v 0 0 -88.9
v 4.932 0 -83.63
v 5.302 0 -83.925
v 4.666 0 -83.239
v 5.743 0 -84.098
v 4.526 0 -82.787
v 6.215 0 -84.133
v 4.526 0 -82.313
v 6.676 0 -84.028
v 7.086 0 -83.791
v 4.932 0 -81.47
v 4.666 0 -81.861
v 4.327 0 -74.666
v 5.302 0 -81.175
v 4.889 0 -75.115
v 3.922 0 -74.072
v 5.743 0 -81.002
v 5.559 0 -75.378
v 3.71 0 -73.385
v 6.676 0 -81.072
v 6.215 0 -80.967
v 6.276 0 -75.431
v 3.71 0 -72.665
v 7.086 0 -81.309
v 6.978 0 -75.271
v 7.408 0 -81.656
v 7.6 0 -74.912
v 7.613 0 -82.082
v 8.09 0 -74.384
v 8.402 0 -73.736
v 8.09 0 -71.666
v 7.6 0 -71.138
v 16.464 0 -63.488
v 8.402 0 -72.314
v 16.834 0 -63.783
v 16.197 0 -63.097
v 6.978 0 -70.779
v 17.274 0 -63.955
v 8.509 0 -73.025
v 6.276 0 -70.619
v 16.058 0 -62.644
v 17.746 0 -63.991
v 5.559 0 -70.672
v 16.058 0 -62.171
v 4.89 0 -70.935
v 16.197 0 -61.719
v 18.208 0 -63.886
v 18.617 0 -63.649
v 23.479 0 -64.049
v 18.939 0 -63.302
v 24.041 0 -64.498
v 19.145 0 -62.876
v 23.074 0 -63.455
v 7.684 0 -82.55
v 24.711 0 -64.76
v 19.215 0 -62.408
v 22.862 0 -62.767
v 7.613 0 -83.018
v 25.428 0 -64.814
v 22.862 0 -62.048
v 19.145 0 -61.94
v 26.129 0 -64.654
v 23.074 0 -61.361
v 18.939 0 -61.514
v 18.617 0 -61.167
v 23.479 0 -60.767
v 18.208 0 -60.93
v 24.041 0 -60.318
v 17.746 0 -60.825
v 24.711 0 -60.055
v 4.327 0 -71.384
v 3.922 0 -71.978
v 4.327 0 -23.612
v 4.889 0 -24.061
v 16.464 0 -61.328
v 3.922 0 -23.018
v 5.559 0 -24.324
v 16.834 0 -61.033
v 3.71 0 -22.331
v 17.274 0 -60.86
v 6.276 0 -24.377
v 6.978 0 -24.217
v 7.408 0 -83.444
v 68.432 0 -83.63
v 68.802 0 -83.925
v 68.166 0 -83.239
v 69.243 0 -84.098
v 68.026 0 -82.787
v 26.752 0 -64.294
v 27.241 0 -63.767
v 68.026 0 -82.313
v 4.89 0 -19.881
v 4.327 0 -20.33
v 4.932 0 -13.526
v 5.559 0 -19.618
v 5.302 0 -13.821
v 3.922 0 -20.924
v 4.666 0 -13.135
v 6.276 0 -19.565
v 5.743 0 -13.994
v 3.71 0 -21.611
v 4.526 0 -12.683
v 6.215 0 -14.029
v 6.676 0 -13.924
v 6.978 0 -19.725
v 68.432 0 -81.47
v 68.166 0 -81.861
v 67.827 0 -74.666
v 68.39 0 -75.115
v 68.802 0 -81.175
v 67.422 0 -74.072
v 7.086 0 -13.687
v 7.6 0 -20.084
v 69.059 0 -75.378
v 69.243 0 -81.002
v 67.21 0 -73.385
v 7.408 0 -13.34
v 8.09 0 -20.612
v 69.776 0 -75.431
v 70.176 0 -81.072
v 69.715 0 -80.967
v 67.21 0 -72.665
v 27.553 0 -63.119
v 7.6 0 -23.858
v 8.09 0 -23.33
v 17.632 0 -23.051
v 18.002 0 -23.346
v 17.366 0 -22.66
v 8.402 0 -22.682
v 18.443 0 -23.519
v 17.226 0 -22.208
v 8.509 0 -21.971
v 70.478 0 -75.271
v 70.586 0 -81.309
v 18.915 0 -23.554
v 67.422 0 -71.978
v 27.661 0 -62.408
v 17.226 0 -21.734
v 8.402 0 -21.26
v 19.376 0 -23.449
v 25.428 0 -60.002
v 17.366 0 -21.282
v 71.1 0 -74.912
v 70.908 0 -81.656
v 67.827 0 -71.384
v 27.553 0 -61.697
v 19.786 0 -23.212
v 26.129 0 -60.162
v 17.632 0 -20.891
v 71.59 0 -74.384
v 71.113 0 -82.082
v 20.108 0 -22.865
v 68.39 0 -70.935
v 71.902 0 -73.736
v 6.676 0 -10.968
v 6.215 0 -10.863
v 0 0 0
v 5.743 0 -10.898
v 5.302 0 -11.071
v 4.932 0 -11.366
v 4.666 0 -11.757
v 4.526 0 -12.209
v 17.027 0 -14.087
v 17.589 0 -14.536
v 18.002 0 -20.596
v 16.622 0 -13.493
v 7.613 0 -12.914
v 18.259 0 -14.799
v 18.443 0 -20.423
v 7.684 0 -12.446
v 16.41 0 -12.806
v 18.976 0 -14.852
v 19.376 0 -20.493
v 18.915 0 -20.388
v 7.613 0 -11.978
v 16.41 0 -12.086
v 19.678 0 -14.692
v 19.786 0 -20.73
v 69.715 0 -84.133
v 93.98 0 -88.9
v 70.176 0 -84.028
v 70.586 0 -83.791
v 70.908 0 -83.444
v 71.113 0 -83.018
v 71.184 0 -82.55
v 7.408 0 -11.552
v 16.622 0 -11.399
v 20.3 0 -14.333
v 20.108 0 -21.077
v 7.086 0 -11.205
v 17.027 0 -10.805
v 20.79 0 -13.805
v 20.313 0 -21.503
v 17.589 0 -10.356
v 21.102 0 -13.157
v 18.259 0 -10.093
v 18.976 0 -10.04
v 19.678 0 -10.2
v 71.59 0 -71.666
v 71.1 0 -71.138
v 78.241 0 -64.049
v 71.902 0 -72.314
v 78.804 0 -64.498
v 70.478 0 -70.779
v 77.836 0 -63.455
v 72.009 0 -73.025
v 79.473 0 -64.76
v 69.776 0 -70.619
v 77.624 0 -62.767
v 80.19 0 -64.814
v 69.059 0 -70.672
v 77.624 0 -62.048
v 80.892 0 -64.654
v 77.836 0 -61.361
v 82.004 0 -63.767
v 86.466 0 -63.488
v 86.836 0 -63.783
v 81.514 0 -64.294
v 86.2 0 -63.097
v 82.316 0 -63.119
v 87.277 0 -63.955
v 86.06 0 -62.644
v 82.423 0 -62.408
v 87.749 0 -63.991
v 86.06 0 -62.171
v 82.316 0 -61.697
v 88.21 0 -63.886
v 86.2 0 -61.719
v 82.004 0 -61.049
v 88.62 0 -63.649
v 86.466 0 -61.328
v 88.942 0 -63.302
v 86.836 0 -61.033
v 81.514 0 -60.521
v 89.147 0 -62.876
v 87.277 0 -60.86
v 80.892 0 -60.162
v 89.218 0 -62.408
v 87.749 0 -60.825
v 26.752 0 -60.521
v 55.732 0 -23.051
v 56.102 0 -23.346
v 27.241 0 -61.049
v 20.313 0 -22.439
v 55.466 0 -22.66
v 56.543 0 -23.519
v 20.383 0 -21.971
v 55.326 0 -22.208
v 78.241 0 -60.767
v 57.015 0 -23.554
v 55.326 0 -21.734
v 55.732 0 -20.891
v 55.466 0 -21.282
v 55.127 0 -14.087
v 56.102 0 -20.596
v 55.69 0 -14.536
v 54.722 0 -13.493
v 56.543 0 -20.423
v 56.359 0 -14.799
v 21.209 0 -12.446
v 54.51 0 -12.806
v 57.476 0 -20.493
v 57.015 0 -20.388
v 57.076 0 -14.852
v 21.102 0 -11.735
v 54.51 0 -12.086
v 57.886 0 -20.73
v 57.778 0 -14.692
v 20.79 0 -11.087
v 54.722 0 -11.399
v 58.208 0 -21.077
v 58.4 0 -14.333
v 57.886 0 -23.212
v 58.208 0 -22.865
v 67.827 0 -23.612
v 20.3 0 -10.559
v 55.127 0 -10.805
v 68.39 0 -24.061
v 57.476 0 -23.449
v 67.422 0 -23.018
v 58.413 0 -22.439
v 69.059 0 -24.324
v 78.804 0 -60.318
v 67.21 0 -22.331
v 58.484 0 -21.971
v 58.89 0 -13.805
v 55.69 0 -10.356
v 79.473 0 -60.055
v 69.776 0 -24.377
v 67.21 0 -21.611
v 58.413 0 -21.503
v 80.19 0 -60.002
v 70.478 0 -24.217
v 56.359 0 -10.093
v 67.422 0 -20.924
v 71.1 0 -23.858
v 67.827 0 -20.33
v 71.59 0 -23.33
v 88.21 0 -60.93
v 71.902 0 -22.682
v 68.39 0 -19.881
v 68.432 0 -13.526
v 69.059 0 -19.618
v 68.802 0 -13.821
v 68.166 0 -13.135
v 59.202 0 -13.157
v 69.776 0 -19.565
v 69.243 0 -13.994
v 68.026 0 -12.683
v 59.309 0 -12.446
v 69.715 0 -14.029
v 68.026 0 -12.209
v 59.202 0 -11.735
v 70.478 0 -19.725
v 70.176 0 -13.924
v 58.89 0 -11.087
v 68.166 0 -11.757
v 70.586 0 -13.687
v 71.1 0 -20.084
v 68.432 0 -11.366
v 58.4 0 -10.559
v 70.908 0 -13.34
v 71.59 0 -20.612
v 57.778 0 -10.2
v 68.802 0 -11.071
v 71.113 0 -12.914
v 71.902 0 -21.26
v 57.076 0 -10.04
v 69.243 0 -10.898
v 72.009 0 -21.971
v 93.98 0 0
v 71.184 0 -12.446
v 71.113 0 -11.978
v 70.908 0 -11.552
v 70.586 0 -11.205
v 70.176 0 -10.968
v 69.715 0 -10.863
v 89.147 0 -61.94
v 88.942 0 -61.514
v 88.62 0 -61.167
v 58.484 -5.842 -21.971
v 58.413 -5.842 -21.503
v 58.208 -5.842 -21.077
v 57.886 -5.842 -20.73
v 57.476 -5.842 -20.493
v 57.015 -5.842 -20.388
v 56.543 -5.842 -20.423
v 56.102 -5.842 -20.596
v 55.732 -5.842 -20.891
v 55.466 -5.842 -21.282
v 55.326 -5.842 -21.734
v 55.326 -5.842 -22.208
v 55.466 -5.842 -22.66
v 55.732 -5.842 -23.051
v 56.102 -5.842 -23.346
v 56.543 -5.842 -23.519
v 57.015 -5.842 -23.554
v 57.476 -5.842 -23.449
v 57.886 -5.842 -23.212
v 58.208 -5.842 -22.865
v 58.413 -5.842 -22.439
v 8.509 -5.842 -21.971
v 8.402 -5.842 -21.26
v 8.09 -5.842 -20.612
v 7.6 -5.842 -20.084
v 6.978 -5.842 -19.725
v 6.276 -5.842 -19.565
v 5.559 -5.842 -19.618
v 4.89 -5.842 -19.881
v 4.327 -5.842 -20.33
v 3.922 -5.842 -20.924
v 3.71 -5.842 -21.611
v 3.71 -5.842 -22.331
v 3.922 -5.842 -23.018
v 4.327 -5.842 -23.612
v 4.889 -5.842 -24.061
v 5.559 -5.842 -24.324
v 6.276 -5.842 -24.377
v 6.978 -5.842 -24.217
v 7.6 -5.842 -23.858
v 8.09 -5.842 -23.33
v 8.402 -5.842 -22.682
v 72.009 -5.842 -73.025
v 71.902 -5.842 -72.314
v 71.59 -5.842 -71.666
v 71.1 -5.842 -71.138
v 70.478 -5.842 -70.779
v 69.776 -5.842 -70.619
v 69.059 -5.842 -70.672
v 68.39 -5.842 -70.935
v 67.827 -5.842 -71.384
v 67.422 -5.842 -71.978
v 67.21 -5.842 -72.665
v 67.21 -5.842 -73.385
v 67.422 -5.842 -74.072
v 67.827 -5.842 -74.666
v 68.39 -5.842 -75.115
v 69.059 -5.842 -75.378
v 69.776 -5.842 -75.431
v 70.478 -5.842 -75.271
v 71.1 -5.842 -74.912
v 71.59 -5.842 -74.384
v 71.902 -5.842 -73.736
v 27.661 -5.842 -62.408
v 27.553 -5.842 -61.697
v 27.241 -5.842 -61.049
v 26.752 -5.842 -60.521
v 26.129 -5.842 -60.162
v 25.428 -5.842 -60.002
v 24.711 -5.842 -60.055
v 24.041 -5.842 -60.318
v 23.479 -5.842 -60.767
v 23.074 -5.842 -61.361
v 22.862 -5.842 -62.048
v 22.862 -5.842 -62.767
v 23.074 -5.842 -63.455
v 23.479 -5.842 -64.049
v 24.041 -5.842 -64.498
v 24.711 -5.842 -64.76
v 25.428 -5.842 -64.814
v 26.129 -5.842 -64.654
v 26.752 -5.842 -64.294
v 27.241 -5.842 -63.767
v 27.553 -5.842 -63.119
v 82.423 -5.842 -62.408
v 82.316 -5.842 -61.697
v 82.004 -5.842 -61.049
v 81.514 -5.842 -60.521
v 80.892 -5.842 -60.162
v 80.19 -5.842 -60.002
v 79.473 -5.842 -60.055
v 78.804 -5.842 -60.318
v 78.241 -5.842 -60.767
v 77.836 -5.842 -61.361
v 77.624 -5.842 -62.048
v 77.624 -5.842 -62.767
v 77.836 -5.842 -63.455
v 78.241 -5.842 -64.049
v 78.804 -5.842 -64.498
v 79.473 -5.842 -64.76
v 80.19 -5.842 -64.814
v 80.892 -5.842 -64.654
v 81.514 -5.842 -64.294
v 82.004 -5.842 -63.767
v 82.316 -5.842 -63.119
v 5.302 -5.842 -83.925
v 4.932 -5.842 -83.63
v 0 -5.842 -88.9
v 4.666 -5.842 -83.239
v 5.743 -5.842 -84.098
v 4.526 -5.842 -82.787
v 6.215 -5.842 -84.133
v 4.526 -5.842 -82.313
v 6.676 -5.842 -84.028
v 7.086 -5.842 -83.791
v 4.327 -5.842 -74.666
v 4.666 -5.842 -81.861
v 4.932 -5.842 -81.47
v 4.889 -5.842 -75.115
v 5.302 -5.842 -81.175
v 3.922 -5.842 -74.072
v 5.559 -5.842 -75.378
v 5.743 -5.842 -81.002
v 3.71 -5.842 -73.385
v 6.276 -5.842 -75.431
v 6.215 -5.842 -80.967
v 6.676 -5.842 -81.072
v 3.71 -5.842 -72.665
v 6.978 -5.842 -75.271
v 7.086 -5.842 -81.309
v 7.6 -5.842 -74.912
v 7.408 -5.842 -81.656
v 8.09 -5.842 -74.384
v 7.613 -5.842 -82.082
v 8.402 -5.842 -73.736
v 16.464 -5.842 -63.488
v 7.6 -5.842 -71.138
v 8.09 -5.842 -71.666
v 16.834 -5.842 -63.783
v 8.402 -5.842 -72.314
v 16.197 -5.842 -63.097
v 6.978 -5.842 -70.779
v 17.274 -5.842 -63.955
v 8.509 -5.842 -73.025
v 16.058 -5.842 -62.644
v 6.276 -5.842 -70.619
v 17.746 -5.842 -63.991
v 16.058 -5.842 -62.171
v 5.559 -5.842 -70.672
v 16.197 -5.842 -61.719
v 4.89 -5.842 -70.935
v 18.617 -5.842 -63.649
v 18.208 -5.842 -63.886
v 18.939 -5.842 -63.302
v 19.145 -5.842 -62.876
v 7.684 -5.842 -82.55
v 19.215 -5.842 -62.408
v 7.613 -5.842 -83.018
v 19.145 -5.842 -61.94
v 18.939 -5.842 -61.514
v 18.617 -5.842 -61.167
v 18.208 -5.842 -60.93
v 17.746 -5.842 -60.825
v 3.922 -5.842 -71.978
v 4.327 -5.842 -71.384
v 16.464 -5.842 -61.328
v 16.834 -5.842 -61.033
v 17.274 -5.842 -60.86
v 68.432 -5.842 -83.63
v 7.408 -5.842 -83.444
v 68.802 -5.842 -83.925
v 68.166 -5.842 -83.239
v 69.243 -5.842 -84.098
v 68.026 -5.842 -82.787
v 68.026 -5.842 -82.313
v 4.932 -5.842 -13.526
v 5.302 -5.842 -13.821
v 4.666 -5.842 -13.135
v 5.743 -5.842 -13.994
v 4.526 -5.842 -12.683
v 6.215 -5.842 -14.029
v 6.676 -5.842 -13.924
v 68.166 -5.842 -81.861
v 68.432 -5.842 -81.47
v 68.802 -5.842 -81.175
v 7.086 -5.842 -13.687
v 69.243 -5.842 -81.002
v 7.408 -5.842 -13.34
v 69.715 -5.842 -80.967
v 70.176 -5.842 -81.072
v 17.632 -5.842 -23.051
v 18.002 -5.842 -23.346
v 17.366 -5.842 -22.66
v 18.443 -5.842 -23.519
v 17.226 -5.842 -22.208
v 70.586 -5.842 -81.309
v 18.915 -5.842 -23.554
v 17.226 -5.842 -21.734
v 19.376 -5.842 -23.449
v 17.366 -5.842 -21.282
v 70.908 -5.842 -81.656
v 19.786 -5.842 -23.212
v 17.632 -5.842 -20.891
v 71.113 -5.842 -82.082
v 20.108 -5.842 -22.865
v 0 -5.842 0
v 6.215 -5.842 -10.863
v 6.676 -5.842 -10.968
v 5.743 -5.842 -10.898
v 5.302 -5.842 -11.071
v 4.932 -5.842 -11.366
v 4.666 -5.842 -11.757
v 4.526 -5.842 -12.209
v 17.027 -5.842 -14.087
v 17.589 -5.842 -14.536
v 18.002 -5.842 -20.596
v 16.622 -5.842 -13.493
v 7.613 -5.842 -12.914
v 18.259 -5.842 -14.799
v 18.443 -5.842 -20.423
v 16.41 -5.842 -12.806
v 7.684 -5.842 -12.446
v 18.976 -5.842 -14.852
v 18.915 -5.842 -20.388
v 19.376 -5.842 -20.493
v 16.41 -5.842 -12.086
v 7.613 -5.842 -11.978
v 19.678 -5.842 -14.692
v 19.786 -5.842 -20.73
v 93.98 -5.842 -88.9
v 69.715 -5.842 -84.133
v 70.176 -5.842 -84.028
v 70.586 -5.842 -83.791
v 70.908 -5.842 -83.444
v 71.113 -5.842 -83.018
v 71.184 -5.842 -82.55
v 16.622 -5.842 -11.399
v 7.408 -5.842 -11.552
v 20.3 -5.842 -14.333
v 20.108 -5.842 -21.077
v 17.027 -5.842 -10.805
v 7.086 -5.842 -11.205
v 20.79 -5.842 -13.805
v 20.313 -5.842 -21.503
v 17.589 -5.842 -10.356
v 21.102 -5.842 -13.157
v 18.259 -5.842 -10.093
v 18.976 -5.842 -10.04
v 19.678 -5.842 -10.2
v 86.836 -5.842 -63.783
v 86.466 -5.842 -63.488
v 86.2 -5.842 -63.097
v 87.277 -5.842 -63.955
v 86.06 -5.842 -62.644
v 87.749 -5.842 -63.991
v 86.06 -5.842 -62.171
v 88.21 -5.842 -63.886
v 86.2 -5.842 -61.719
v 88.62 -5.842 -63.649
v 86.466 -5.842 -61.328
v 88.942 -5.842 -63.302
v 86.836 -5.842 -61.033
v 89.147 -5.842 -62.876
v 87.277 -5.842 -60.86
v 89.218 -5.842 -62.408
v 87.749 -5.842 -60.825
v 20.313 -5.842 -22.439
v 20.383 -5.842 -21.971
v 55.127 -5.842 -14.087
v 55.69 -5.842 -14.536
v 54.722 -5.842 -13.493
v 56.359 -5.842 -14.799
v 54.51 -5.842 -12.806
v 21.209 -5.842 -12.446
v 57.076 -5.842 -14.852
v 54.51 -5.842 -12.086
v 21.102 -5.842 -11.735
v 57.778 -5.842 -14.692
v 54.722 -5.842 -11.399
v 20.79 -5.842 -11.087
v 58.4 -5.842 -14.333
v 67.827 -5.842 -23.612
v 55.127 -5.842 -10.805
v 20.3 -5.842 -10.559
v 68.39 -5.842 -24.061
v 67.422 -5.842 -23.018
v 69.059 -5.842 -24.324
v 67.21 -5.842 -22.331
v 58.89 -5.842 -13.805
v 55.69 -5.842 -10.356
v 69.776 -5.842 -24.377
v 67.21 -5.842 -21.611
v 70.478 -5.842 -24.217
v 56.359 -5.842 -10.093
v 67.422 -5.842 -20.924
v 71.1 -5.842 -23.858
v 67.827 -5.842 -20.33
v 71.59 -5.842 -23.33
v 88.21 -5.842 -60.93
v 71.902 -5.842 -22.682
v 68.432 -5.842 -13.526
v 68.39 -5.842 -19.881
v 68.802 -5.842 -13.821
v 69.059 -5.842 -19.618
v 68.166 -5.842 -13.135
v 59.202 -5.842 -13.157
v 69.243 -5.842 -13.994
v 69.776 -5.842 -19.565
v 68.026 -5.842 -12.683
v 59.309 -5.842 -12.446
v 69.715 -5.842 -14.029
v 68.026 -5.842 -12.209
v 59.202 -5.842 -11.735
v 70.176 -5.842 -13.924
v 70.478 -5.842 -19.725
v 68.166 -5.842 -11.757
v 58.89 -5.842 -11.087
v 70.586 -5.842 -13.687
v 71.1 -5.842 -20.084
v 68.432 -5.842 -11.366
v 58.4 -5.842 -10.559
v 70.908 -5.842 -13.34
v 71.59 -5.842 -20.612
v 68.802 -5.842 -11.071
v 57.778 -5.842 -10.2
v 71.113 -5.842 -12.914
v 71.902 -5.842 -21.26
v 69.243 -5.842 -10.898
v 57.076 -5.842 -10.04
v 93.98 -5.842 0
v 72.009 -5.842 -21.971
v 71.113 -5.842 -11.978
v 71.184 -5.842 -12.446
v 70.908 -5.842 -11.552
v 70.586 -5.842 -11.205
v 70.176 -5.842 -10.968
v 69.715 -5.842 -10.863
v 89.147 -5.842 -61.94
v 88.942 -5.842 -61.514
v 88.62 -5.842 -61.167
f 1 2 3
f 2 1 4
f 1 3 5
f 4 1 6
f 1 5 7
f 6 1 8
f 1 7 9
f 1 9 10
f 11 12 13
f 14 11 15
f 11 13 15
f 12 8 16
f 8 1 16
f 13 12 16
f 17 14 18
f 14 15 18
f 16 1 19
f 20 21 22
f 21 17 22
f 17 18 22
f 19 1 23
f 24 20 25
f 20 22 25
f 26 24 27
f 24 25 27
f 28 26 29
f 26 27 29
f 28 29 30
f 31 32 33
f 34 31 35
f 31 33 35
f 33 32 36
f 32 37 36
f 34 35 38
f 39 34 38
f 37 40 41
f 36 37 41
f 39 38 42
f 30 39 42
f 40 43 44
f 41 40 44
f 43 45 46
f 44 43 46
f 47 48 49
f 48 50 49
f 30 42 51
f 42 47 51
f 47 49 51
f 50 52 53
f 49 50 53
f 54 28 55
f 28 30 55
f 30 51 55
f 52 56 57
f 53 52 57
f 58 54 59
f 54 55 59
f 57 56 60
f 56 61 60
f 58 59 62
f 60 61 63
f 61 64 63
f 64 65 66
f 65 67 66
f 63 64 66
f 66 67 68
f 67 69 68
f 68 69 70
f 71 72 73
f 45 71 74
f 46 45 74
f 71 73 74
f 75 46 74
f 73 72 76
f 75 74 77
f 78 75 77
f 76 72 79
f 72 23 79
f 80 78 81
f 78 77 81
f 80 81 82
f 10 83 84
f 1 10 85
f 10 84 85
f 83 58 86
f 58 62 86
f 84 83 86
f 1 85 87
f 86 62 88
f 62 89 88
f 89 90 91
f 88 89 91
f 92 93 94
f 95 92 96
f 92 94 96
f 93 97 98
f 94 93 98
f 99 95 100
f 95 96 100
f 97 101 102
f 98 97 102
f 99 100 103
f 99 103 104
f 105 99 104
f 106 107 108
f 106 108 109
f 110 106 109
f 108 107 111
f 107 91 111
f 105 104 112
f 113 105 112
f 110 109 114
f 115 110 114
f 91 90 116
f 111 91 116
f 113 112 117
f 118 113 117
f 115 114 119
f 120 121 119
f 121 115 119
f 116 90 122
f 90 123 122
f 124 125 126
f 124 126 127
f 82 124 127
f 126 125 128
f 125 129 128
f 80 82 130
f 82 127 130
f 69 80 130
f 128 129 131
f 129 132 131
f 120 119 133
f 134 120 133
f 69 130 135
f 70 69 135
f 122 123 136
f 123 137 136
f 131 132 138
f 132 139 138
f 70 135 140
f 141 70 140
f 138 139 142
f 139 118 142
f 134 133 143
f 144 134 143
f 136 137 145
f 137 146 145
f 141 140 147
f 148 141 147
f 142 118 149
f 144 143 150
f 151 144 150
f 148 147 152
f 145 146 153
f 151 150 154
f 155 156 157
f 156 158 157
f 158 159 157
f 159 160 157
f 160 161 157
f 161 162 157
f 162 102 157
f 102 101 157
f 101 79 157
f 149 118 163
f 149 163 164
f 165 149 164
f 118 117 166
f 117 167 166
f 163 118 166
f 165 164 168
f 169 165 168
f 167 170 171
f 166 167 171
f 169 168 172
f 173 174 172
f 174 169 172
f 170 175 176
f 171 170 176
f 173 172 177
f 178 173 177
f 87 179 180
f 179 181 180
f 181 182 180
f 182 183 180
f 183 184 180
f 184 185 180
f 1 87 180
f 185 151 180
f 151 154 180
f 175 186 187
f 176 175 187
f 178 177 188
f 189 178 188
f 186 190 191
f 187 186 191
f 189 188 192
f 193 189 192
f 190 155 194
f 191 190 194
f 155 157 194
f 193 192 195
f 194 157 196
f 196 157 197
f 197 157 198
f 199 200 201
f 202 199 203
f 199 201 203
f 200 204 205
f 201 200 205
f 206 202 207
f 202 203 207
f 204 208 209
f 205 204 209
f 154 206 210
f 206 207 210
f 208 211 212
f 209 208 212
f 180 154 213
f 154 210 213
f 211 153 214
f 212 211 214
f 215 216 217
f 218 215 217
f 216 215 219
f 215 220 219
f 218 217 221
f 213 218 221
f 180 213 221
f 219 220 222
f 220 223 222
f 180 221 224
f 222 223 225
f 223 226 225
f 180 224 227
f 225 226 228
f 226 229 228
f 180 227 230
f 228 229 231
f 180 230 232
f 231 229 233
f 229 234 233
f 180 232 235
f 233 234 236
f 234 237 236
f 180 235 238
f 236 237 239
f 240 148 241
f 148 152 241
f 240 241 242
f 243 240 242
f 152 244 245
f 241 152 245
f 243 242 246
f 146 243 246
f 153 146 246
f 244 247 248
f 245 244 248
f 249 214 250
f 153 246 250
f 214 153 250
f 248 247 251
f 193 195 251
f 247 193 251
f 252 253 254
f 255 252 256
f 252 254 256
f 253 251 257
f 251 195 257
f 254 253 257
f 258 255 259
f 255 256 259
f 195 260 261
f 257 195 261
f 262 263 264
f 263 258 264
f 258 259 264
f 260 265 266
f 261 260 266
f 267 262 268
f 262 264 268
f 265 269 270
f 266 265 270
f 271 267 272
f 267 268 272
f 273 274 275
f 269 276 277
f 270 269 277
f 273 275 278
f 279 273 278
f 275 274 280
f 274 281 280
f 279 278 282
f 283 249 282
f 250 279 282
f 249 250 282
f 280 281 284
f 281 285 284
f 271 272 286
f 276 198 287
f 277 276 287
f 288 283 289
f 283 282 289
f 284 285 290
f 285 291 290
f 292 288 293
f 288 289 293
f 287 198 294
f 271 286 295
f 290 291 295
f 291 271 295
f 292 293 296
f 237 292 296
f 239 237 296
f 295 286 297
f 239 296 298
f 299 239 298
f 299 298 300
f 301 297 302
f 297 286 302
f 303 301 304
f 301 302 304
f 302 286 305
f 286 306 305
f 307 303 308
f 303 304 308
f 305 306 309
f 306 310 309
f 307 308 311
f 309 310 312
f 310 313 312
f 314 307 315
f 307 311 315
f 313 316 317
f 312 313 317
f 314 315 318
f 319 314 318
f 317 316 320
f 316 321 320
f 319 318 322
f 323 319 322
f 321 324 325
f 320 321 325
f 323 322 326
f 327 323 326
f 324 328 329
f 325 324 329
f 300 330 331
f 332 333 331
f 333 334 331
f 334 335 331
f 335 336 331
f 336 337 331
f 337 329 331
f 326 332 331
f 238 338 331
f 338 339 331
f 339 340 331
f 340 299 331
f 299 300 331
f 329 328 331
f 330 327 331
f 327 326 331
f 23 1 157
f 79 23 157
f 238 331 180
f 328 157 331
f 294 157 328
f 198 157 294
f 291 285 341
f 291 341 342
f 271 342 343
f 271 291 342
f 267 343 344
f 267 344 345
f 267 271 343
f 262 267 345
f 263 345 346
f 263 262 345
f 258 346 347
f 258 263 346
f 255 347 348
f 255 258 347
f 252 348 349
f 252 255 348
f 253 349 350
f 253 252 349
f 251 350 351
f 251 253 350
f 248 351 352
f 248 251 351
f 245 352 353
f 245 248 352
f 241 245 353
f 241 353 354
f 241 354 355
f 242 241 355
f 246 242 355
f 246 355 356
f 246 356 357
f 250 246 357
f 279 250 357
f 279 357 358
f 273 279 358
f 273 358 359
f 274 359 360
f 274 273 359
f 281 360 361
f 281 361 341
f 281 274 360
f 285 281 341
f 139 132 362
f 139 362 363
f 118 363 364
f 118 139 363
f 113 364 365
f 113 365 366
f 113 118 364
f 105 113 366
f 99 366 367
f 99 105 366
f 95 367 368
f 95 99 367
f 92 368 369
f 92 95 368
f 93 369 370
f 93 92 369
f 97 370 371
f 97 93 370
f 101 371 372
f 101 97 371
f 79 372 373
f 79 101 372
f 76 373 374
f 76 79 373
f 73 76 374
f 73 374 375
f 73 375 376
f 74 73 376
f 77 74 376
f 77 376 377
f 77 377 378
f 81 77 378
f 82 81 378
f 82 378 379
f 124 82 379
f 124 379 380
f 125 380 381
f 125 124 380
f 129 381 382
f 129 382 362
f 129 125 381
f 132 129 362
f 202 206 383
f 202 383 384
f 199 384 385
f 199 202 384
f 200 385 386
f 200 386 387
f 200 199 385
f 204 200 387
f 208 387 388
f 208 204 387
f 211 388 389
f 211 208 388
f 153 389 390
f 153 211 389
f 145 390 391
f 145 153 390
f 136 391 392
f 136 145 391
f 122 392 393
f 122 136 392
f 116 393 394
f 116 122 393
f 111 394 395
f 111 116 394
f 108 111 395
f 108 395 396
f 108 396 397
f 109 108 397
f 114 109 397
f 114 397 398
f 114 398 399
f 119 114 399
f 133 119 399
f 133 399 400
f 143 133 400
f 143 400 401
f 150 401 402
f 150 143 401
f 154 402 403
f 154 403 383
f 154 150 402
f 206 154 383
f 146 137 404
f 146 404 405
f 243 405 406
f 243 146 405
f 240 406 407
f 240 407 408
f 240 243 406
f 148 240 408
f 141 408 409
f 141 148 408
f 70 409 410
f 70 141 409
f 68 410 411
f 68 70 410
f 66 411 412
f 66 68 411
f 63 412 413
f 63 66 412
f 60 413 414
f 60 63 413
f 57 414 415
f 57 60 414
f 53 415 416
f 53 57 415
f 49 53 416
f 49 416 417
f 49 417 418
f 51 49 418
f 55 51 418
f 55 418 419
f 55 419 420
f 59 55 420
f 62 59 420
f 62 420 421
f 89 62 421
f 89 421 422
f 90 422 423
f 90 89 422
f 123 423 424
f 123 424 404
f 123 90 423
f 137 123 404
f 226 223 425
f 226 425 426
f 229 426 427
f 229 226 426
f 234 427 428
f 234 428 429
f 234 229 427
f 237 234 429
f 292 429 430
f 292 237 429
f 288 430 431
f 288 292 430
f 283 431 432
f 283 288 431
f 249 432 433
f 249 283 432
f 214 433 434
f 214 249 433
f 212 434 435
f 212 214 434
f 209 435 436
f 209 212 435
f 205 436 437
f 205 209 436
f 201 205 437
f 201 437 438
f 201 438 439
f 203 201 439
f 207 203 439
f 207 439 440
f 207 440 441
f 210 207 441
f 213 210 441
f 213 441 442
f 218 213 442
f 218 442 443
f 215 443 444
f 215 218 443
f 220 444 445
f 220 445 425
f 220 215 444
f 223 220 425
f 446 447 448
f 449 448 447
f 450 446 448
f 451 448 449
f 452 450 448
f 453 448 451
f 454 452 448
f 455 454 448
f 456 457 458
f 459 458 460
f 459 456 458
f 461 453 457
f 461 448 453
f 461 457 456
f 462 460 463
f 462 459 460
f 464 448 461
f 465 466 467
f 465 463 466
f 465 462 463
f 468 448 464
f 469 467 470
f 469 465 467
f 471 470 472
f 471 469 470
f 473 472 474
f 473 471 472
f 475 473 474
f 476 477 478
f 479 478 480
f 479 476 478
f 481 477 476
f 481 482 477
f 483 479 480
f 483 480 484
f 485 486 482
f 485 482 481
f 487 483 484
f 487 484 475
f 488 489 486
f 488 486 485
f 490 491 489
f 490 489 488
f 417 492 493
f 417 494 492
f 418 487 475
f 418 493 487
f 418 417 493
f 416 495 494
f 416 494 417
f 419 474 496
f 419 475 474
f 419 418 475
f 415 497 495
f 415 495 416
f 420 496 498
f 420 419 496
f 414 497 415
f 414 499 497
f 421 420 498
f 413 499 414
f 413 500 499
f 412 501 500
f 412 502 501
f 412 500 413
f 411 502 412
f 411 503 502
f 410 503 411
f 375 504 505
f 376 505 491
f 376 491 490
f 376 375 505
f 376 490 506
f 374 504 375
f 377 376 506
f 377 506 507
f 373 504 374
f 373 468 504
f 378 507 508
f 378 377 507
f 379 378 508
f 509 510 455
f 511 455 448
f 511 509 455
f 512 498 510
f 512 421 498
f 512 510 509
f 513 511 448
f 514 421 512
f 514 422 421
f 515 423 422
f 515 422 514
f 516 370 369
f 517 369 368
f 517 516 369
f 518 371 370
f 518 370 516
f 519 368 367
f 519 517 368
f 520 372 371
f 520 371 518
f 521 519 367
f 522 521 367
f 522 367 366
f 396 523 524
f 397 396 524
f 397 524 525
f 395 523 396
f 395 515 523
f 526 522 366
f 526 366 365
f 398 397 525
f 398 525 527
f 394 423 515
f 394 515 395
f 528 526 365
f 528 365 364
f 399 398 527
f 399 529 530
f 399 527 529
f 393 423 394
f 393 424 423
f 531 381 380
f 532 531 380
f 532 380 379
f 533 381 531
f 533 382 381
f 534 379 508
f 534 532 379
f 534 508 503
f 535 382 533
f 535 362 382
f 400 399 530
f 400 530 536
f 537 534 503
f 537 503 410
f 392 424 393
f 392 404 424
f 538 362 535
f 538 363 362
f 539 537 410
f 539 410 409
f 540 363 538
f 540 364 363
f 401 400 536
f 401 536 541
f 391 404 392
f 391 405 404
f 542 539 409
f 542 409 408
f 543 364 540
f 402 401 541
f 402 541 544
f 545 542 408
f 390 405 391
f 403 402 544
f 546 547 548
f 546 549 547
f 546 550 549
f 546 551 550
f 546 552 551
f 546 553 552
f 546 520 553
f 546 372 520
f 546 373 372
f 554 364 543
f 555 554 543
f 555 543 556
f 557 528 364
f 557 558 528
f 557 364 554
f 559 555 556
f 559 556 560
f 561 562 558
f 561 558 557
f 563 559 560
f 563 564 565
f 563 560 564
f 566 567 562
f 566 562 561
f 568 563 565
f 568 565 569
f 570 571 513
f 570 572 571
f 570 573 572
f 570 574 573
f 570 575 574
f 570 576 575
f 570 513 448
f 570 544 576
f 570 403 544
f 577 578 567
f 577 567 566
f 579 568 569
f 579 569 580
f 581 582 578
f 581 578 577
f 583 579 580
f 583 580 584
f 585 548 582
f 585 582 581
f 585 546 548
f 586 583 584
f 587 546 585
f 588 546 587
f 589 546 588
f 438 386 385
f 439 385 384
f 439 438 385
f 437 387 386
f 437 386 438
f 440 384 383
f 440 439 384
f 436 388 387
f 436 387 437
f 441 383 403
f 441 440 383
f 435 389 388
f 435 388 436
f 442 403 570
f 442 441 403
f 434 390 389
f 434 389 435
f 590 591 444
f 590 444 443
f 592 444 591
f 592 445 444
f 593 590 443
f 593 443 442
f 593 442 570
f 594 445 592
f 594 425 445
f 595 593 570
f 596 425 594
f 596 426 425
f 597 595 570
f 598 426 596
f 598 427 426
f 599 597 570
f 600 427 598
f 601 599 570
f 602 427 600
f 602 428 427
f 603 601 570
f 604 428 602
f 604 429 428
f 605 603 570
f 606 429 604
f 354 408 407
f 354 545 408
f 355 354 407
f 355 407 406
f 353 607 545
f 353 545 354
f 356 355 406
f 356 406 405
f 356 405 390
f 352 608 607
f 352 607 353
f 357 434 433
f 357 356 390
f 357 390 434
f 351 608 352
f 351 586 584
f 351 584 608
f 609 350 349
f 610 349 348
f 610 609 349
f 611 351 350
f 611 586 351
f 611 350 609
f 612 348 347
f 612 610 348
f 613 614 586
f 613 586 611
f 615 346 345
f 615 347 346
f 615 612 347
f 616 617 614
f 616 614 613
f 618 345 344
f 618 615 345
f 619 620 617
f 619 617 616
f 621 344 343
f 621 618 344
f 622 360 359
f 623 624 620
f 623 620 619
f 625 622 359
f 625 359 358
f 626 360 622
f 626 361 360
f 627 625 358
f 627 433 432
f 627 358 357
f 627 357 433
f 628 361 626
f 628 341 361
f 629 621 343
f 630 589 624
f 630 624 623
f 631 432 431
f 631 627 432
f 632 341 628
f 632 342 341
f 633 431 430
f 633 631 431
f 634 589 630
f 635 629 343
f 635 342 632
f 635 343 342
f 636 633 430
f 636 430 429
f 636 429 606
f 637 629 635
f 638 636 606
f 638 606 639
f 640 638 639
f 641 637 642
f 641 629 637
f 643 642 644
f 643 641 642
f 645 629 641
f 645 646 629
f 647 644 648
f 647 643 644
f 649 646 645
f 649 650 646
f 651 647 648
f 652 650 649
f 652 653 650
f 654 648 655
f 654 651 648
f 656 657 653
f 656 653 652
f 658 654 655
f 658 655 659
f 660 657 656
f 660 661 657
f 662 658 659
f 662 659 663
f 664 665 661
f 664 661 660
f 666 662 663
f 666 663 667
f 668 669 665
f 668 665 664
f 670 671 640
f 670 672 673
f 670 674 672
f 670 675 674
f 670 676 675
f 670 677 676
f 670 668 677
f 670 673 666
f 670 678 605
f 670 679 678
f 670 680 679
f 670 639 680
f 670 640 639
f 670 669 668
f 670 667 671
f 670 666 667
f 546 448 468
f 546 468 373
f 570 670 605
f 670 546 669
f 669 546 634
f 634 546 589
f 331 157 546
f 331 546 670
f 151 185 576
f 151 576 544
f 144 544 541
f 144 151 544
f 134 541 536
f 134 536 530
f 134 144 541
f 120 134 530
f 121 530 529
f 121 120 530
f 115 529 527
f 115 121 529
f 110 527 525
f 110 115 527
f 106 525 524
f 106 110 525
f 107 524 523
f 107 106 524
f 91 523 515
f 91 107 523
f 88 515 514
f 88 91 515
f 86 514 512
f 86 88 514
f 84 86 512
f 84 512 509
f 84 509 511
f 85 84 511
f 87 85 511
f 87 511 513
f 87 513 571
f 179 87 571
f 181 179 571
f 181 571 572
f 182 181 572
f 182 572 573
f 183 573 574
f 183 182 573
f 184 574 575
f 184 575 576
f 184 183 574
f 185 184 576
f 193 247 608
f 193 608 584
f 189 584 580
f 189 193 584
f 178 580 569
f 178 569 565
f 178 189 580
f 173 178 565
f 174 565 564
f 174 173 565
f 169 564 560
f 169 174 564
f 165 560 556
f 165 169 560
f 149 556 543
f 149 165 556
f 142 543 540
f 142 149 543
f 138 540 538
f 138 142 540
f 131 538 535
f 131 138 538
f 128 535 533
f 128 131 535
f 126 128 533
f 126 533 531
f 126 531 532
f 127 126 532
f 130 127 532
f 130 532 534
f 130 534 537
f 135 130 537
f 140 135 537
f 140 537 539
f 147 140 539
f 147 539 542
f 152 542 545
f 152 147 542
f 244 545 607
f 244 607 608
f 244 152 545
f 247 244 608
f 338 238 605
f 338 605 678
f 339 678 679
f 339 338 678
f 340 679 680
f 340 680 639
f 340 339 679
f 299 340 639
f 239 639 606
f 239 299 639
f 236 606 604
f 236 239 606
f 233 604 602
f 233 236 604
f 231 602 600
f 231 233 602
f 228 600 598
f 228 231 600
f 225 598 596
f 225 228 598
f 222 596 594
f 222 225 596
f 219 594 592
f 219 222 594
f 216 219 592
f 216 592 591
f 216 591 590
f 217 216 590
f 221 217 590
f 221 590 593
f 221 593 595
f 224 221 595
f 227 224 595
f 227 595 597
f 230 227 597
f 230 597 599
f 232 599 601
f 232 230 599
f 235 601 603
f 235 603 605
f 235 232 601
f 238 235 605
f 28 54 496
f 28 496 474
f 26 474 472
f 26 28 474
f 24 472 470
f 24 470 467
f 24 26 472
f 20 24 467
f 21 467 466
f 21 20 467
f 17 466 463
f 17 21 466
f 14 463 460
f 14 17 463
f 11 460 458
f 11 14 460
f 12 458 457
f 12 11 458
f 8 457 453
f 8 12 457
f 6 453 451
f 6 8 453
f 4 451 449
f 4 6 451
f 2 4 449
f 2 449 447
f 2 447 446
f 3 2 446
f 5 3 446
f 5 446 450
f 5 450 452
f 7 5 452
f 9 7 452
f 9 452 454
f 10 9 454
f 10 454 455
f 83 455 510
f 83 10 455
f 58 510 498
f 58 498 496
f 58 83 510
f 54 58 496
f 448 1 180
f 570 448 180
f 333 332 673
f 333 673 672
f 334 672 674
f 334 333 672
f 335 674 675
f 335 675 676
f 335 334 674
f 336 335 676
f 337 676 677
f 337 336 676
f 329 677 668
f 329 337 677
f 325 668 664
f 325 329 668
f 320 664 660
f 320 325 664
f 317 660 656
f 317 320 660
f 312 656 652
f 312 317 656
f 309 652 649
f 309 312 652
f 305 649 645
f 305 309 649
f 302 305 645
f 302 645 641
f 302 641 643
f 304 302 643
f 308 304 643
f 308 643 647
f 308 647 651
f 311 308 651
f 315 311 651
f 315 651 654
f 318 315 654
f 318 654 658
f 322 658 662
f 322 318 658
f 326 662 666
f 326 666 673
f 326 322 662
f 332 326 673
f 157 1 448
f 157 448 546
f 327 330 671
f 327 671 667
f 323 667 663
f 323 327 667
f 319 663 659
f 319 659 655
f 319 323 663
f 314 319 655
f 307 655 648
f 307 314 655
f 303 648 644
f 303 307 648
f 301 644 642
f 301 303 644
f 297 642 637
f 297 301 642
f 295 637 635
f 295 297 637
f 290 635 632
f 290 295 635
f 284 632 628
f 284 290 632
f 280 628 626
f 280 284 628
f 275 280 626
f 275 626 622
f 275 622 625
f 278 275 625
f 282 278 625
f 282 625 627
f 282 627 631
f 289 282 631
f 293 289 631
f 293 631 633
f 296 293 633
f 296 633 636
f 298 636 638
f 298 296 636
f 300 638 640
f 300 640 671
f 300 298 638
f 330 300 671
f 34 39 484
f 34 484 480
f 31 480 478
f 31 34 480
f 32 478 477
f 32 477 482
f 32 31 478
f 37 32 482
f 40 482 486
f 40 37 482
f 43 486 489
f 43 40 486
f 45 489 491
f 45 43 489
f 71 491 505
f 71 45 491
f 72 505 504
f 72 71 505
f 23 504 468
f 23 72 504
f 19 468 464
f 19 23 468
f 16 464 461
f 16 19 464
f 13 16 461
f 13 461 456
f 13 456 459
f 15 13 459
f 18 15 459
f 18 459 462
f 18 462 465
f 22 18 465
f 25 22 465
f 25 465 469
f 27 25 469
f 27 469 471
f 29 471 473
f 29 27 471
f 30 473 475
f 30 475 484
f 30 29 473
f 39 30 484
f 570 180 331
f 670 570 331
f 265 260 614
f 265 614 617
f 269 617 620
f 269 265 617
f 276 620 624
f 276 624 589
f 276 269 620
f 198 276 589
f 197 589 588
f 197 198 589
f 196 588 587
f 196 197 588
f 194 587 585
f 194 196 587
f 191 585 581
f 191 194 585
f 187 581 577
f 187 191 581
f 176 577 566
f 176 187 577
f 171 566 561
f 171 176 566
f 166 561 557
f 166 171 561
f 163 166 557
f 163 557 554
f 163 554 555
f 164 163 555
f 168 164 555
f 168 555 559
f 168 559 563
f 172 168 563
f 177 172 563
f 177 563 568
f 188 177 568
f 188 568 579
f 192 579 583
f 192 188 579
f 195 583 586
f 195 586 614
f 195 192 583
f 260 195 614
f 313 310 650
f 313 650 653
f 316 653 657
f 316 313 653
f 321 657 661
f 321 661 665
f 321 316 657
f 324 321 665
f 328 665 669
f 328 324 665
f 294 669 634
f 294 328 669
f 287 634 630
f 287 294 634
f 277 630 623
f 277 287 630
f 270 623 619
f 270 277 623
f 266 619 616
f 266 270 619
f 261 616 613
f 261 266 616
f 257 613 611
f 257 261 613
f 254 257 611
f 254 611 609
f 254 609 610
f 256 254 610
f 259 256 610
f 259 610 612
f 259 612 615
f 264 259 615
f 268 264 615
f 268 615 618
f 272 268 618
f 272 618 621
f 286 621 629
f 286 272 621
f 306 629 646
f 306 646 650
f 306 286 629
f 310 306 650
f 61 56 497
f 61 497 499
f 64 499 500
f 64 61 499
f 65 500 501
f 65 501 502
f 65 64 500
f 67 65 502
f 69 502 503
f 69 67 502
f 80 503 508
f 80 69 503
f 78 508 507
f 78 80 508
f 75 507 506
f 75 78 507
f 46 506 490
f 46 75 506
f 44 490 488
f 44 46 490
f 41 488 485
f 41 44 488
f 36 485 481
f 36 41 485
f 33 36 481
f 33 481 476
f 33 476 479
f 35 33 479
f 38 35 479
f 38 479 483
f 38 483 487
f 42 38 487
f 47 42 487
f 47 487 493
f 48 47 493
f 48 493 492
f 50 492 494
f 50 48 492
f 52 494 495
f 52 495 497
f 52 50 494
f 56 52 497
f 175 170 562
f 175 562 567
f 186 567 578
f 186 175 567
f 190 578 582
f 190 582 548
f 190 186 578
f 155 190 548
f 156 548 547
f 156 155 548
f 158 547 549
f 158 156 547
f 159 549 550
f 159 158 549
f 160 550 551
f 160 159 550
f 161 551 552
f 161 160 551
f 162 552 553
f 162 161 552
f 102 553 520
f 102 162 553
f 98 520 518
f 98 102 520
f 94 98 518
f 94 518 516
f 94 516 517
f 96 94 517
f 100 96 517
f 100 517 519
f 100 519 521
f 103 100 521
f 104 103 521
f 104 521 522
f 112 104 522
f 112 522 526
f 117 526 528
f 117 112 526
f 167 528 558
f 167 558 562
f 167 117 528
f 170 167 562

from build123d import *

# Parameters (mm, degrees)
F0_W     = 93.98
F0_H     = 88.9
F0_R     = 1.5875
F0_R_2   = 2.413
F1_DEPTH = 5.842


with BuildPart() as f1:
    # F0 (on Front) → F1 (new body)
    with BuildSketch(Plane.XZ):
        with Locations((46.99, -44.45)):
            Rectangle(F0_W, F0_H)
        with Locations((6.096, -82.55)):
            Circle(F0_R, mode=Mode.SUBTRACT)
        with Locations((6.096, -73.025)):
            Circle(F0_R_2, mode=Mode.SUBTRACT)
        with Locations((17.6276, -62.4078)):
            Circle(F0_R, mode=Mode.SUBTRACT)
        with Locations((25.2476, -62.4078)):
            Circle(F0_R_2, mode=Mode.SUBTRACT)
        with Locations((69.596, -82.55)):
            Circle(F0_R, mode=Mode.SUBTRACT)
        with Locations((69.596, -73.025)):
            Circle(F0_R_2, mode=Mode.SUBTRACT)
        with Locations((80.01, -62.4078)):
            Circle(F0_R_2, mode=Mode.SUBTRACT)
        with Locations((87.63, -62.4078)):
            Circle(F0_R, mode=Mode.SUBTRACT)
        with Locations((6.096, -21.971)):
            Circle(F0_R_2, mode=Mode.SUBTRACT)
        with Locations((6.096, -12.446)):
            Circle(F0_R, mode=Mode.SUBTRACT)
        with Locations((18.796, -21.971)):
            Circle(F0_R, mode=Mode.SUBTRACT)
        with Locations((18.796, -12.446)):
            Circle(F0_R_2, mode=Mode.SUBTRACT)
        with Locations((56.896, -21.971)):
            Circle(F0_R, mode=Mode.SUBTRACT)
        with Locations((56.896, -12.446)):
            Circle(F0_R_2, mode=Mode.SUBTRACT)
        with Locations((69.596, -21.971)):
            Circle(F0_R_2, mode=Mode.SUBTRACT)
        with Locations((69.596, -12.446)):
            Circle(F0_R, mode=Mode.SUBTRACT)
    extrude(amount=F1_DEPTH)


solid = f1.part
